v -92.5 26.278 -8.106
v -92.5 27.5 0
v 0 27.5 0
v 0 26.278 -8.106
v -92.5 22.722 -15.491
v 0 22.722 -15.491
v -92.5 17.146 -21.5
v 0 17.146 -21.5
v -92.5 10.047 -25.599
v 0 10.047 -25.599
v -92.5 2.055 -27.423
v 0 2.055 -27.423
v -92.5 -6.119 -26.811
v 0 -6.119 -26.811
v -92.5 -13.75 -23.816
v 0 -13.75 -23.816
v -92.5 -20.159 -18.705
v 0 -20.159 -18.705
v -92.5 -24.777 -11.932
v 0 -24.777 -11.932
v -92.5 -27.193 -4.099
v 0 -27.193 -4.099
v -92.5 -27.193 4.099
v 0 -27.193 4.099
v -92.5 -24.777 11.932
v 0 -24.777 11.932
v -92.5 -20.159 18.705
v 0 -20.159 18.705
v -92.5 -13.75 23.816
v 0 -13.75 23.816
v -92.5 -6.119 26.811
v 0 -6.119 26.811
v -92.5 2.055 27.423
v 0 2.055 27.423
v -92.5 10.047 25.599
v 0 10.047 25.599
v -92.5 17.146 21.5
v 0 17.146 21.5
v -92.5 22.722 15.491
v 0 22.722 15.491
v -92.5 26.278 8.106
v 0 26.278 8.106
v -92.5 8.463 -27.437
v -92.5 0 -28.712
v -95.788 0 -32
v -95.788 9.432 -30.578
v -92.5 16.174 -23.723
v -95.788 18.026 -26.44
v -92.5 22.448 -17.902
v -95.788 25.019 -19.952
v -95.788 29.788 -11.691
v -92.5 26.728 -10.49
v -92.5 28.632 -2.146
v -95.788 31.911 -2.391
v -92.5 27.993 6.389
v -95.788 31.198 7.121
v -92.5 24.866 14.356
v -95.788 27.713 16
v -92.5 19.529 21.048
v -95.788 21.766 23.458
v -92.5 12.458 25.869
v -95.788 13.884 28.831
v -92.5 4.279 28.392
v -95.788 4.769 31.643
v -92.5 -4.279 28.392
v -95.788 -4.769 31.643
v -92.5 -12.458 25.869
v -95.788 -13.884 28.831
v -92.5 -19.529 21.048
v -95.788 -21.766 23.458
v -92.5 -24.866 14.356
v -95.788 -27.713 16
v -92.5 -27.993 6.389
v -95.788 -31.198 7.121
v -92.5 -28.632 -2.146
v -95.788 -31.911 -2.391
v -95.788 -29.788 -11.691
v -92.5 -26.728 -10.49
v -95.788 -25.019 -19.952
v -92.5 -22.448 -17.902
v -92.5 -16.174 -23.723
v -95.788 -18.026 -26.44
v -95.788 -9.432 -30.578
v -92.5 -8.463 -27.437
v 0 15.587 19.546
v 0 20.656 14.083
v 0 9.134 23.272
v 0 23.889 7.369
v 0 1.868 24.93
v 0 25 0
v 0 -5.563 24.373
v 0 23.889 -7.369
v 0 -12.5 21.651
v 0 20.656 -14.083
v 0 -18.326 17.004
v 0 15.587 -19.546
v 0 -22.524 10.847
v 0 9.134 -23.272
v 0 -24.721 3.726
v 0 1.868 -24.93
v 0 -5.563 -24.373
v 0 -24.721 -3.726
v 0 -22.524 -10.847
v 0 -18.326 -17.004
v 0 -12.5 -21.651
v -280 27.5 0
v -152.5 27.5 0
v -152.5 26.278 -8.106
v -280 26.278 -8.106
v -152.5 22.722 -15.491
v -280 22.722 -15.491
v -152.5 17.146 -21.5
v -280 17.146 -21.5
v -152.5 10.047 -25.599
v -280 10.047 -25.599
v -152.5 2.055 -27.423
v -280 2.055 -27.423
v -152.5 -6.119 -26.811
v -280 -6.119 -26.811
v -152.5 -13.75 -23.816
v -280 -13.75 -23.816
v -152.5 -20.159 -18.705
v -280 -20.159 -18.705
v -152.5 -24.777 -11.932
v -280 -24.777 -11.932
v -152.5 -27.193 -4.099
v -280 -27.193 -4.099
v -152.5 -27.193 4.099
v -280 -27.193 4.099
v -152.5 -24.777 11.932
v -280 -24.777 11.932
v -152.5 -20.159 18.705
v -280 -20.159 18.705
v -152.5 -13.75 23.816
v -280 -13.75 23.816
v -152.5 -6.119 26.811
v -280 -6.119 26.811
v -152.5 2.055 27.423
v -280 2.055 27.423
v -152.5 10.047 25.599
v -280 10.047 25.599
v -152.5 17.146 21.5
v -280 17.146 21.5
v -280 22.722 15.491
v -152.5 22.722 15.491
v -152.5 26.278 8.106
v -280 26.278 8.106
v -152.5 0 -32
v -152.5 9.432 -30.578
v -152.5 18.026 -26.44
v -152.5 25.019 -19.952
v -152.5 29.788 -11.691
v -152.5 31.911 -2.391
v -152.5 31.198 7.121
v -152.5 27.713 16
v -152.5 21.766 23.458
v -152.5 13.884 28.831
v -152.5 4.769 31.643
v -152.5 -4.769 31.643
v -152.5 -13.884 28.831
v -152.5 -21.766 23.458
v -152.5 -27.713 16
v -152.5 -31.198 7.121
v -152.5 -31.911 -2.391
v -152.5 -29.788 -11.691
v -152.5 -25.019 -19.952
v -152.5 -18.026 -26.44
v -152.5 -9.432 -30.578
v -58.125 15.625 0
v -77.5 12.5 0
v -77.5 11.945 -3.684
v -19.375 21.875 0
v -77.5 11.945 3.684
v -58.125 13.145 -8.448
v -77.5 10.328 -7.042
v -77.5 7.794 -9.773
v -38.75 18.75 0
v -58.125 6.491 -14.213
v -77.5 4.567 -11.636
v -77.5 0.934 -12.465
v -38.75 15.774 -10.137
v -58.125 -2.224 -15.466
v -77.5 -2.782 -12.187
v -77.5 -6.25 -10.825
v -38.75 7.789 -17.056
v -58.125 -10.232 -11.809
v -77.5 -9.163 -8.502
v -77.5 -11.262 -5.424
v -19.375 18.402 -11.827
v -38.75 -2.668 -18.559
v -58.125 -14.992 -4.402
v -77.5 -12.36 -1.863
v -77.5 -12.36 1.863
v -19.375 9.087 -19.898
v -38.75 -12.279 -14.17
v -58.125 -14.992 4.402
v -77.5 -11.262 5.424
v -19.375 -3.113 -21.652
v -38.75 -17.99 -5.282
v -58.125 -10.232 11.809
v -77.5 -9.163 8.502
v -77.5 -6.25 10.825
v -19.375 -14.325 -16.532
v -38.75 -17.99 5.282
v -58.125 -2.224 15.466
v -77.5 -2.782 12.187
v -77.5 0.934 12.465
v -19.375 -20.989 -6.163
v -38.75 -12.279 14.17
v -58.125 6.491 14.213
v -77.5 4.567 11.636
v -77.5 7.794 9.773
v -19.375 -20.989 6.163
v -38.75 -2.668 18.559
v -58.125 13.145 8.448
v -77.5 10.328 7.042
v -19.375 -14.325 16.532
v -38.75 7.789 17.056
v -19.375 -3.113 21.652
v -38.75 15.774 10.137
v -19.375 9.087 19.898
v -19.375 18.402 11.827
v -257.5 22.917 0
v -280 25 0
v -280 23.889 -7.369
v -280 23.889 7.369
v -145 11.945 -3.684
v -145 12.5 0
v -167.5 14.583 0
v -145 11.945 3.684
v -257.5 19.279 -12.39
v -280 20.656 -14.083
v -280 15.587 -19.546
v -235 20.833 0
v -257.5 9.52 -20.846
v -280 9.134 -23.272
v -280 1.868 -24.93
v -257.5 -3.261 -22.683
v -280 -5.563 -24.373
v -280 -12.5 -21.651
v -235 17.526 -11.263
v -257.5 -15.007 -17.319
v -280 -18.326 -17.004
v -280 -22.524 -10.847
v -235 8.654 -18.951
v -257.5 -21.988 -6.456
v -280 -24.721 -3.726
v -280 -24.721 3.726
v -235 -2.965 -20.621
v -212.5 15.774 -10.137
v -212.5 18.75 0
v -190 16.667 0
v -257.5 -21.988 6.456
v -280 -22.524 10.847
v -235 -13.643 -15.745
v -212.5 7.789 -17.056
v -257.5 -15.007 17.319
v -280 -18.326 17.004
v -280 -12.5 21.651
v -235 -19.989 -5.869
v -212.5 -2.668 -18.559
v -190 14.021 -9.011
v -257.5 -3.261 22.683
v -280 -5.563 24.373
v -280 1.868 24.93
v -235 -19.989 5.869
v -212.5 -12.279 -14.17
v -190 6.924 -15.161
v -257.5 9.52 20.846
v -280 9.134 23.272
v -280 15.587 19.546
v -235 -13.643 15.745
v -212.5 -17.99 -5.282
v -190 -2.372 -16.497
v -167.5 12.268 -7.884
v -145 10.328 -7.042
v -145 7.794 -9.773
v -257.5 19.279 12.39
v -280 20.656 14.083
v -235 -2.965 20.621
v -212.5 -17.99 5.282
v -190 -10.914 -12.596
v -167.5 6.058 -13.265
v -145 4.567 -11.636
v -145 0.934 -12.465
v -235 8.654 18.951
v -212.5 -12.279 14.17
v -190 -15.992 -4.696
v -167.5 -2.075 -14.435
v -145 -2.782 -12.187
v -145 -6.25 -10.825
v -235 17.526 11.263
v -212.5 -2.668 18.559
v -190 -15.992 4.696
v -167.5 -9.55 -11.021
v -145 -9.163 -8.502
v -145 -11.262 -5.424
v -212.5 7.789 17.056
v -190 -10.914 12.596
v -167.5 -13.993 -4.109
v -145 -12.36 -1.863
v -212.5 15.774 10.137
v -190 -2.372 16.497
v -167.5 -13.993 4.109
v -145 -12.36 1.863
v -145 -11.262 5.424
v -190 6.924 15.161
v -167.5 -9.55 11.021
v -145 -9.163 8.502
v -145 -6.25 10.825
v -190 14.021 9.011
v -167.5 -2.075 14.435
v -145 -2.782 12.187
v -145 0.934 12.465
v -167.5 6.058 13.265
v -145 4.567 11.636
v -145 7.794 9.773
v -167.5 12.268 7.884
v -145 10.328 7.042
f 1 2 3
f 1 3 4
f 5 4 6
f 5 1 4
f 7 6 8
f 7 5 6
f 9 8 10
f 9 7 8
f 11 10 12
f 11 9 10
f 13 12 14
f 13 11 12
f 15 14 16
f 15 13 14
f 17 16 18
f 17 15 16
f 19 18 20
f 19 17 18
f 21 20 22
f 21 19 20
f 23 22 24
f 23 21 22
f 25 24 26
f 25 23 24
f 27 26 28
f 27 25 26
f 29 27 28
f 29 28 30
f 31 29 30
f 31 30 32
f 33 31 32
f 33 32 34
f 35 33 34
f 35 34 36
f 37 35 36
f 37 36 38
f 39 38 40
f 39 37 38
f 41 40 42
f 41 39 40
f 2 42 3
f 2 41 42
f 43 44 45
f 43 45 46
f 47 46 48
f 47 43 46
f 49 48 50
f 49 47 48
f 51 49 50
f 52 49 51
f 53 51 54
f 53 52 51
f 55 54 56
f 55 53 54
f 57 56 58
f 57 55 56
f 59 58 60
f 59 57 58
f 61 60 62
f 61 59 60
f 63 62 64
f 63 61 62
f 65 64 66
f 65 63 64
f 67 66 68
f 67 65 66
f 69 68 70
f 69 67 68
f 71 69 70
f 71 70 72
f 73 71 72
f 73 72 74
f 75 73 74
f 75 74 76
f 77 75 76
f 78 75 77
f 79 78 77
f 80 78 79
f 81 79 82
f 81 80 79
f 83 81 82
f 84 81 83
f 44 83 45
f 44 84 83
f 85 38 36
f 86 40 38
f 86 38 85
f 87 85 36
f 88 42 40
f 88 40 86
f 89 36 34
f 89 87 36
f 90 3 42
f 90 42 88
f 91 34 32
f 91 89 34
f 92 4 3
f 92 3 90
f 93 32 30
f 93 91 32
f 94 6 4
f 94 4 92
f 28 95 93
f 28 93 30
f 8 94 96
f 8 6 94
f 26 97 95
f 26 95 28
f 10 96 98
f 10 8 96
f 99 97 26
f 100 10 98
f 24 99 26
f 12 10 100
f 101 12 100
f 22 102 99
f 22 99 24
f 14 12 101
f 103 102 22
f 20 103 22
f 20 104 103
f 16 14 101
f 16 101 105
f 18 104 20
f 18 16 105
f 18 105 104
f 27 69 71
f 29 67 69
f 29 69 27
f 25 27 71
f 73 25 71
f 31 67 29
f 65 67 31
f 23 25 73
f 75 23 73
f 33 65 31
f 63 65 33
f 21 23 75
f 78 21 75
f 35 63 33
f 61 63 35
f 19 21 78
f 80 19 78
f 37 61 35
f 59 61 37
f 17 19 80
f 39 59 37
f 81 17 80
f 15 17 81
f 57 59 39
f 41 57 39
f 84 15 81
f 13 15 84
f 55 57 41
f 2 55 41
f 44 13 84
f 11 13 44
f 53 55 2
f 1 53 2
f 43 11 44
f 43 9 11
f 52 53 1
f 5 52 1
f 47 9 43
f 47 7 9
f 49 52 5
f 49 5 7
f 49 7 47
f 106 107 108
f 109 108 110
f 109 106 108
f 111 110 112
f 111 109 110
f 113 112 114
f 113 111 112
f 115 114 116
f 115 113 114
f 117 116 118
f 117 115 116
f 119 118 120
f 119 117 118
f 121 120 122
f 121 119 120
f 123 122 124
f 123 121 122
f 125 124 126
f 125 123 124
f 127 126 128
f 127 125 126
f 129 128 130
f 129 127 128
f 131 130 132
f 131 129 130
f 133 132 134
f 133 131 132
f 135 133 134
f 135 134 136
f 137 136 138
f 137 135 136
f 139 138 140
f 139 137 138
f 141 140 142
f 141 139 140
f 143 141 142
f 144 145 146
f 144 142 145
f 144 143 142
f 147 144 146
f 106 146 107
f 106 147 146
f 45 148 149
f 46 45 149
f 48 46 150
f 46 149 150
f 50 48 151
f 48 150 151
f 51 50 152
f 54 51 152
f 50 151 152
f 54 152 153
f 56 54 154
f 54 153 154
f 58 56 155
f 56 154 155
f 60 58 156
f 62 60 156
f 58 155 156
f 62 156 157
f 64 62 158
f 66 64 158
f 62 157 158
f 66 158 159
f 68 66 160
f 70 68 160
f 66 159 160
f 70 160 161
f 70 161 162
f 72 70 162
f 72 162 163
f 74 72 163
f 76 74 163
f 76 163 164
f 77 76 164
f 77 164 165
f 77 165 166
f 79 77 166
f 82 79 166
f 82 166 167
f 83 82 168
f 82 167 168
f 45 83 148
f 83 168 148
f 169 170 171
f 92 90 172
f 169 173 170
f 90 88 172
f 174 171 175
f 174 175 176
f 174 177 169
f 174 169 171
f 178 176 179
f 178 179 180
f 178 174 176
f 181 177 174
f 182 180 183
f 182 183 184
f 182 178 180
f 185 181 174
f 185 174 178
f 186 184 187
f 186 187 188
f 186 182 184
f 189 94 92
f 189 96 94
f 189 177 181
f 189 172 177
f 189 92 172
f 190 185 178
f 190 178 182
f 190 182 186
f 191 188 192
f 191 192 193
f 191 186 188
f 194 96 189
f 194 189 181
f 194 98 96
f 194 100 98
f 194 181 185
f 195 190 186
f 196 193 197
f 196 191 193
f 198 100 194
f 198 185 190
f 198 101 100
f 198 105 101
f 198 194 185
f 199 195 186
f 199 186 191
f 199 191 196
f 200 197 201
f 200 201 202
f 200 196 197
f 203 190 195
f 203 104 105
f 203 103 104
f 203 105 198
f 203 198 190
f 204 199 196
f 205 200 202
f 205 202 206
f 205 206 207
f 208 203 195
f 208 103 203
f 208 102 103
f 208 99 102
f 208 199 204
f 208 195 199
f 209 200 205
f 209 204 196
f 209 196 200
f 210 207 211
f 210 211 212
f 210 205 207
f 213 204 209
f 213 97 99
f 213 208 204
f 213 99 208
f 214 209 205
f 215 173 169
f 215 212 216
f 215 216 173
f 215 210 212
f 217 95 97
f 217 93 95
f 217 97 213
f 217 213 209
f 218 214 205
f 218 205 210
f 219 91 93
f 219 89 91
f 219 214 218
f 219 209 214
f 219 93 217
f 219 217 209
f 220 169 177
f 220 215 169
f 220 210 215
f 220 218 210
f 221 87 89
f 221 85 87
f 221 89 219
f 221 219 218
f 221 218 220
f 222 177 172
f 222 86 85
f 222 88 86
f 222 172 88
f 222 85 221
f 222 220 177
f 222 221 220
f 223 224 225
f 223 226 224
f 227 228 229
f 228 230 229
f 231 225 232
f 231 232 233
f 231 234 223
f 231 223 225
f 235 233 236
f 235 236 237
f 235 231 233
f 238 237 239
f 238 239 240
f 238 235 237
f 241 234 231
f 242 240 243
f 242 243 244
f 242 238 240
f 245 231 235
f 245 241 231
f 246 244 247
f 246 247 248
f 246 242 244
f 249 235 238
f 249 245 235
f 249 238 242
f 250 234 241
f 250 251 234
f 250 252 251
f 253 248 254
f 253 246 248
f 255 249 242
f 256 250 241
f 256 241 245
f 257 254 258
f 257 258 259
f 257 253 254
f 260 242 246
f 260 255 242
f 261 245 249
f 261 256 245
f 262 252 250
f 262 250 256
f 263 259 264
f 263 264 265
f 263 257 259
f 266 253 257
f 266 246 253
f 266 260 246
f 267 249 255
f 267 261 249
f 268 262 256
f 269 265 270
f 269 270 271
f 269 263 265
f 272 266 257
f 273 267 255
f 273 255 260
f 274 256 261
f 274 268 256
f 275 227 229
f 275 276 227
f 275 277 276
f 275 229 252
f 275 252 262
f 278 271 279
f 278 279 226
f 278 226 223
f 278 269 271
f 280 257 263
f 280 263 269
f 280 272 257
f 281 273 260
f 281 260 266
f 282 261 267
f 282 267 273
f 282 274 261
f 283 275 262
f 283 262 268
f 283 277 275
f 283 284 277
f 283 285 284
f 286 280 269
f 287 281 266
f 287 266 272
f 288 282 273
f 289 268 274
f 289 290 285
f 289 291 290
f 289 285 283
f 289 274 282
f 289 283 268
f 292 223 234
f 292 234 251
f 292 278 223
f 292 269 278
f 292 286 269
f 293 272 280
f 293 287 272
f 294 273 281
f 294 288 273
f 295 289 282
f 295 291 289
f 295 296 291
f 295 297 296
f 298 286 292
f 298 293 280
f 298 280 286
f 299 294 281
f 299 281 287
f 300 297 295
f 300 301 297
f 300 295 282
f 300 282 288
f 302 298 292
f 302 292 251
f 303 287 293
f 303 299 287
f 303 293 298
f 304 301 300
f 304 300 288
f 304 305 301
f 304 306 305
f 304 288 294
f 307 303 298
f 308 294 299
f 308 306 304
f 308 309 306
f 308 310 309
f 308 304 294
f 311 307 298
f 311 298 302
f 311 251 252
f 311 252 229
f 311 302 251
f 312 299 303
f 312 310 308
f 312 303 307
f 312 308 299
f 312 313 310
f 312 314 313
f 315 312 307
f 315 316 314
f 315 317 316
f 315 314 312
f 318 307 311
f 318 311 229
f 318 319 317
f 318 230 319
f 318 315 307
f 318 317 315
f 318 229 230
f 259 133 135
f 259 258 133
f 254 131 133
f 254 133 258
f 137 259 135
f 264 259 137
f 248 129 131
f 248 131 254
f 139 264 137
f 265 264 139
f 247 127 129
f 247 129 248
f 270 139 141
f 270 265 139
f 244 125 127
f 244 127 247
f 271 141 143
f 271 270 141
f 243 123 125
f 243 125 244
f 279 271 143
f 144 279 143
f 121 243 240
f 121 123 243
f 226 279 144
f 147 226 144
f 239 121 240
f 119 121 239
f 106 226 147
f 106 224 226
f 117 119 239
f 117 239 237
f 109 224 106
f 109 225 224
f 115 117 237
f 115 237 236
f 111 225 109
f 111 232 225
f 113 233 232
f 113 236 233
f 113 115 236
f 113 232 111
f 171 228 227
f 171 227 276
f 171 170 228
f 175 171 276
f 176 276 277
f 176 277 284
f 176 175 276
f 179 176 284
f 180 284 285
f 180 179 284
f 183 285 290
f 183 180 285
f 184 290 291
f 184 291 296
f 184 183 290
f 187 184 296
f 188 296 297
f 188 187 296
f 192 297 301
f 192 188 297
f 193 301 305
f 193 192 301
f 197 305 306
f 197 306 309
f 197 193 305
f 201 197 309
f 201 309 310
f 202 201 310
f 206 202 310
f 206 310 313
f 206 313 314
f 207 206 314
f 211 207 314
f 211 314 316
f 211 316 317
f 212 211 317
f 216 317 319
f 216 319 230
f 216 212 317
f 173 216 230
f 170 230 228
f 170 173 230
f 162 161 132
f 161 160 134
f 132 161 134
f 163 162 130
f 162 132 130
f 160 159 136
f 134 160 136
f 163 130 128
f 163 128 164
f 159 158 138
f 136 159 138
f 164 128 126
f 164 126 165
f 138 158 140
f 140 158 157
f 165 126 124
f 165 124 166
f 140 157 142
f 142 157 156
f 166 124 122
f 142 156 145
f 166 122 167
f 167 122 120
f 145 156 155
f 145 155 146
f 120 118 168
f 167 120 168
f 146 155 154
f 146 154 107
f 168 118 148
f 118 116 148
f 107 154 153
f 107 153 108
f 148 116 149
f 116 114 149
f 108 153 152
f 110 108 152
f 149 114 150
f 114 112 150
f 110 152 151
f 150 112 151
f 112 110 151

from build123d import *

# Parameters (mm, degrees)
SKETCH_2_R      = 32
SKETCH_2_R_2    = 27.5
EXTRUDE_1_DEPTH = 60
CHAMFER_1_SIZE  = 3.2875


with BuildPart() as part:
    # Эскиз1 → Повернуть1 (revolve)
    with BuildSketch(Plane.XY):
        Polygon((0, 27.5), (-280, 27.5), (-280, 25), (-145, 12.5), (-77.5, 12.5), (0, 25), align=None)
    revolve(axis=Axis((0, 0, 0), (-1, 0, 0)))

    # Эскиз2 → Бобышка-Вытянуть1 (add)
    with BuildSketch(Plane(origin=(-152.5, 0, 0), x_dir=(0, 0, -1), z_dir=(1, 0, 0))):
        Circle(SKETCH_2_R)
        Circle(SKETCH_2_R_2, mode=Mode.SUBTRACT)
    extrude(amount=EXTRUDE_1_DEPTH)

    # Фаска1
    chamfer_1_edges = [part.edges().sort_by_distance(p)[0] for p in [
        (-92.5, 0, 32),
    ]]
    chamfer(chamfer_1_edges, length=CHAMFER_1_SIZE)


solid = part.part
